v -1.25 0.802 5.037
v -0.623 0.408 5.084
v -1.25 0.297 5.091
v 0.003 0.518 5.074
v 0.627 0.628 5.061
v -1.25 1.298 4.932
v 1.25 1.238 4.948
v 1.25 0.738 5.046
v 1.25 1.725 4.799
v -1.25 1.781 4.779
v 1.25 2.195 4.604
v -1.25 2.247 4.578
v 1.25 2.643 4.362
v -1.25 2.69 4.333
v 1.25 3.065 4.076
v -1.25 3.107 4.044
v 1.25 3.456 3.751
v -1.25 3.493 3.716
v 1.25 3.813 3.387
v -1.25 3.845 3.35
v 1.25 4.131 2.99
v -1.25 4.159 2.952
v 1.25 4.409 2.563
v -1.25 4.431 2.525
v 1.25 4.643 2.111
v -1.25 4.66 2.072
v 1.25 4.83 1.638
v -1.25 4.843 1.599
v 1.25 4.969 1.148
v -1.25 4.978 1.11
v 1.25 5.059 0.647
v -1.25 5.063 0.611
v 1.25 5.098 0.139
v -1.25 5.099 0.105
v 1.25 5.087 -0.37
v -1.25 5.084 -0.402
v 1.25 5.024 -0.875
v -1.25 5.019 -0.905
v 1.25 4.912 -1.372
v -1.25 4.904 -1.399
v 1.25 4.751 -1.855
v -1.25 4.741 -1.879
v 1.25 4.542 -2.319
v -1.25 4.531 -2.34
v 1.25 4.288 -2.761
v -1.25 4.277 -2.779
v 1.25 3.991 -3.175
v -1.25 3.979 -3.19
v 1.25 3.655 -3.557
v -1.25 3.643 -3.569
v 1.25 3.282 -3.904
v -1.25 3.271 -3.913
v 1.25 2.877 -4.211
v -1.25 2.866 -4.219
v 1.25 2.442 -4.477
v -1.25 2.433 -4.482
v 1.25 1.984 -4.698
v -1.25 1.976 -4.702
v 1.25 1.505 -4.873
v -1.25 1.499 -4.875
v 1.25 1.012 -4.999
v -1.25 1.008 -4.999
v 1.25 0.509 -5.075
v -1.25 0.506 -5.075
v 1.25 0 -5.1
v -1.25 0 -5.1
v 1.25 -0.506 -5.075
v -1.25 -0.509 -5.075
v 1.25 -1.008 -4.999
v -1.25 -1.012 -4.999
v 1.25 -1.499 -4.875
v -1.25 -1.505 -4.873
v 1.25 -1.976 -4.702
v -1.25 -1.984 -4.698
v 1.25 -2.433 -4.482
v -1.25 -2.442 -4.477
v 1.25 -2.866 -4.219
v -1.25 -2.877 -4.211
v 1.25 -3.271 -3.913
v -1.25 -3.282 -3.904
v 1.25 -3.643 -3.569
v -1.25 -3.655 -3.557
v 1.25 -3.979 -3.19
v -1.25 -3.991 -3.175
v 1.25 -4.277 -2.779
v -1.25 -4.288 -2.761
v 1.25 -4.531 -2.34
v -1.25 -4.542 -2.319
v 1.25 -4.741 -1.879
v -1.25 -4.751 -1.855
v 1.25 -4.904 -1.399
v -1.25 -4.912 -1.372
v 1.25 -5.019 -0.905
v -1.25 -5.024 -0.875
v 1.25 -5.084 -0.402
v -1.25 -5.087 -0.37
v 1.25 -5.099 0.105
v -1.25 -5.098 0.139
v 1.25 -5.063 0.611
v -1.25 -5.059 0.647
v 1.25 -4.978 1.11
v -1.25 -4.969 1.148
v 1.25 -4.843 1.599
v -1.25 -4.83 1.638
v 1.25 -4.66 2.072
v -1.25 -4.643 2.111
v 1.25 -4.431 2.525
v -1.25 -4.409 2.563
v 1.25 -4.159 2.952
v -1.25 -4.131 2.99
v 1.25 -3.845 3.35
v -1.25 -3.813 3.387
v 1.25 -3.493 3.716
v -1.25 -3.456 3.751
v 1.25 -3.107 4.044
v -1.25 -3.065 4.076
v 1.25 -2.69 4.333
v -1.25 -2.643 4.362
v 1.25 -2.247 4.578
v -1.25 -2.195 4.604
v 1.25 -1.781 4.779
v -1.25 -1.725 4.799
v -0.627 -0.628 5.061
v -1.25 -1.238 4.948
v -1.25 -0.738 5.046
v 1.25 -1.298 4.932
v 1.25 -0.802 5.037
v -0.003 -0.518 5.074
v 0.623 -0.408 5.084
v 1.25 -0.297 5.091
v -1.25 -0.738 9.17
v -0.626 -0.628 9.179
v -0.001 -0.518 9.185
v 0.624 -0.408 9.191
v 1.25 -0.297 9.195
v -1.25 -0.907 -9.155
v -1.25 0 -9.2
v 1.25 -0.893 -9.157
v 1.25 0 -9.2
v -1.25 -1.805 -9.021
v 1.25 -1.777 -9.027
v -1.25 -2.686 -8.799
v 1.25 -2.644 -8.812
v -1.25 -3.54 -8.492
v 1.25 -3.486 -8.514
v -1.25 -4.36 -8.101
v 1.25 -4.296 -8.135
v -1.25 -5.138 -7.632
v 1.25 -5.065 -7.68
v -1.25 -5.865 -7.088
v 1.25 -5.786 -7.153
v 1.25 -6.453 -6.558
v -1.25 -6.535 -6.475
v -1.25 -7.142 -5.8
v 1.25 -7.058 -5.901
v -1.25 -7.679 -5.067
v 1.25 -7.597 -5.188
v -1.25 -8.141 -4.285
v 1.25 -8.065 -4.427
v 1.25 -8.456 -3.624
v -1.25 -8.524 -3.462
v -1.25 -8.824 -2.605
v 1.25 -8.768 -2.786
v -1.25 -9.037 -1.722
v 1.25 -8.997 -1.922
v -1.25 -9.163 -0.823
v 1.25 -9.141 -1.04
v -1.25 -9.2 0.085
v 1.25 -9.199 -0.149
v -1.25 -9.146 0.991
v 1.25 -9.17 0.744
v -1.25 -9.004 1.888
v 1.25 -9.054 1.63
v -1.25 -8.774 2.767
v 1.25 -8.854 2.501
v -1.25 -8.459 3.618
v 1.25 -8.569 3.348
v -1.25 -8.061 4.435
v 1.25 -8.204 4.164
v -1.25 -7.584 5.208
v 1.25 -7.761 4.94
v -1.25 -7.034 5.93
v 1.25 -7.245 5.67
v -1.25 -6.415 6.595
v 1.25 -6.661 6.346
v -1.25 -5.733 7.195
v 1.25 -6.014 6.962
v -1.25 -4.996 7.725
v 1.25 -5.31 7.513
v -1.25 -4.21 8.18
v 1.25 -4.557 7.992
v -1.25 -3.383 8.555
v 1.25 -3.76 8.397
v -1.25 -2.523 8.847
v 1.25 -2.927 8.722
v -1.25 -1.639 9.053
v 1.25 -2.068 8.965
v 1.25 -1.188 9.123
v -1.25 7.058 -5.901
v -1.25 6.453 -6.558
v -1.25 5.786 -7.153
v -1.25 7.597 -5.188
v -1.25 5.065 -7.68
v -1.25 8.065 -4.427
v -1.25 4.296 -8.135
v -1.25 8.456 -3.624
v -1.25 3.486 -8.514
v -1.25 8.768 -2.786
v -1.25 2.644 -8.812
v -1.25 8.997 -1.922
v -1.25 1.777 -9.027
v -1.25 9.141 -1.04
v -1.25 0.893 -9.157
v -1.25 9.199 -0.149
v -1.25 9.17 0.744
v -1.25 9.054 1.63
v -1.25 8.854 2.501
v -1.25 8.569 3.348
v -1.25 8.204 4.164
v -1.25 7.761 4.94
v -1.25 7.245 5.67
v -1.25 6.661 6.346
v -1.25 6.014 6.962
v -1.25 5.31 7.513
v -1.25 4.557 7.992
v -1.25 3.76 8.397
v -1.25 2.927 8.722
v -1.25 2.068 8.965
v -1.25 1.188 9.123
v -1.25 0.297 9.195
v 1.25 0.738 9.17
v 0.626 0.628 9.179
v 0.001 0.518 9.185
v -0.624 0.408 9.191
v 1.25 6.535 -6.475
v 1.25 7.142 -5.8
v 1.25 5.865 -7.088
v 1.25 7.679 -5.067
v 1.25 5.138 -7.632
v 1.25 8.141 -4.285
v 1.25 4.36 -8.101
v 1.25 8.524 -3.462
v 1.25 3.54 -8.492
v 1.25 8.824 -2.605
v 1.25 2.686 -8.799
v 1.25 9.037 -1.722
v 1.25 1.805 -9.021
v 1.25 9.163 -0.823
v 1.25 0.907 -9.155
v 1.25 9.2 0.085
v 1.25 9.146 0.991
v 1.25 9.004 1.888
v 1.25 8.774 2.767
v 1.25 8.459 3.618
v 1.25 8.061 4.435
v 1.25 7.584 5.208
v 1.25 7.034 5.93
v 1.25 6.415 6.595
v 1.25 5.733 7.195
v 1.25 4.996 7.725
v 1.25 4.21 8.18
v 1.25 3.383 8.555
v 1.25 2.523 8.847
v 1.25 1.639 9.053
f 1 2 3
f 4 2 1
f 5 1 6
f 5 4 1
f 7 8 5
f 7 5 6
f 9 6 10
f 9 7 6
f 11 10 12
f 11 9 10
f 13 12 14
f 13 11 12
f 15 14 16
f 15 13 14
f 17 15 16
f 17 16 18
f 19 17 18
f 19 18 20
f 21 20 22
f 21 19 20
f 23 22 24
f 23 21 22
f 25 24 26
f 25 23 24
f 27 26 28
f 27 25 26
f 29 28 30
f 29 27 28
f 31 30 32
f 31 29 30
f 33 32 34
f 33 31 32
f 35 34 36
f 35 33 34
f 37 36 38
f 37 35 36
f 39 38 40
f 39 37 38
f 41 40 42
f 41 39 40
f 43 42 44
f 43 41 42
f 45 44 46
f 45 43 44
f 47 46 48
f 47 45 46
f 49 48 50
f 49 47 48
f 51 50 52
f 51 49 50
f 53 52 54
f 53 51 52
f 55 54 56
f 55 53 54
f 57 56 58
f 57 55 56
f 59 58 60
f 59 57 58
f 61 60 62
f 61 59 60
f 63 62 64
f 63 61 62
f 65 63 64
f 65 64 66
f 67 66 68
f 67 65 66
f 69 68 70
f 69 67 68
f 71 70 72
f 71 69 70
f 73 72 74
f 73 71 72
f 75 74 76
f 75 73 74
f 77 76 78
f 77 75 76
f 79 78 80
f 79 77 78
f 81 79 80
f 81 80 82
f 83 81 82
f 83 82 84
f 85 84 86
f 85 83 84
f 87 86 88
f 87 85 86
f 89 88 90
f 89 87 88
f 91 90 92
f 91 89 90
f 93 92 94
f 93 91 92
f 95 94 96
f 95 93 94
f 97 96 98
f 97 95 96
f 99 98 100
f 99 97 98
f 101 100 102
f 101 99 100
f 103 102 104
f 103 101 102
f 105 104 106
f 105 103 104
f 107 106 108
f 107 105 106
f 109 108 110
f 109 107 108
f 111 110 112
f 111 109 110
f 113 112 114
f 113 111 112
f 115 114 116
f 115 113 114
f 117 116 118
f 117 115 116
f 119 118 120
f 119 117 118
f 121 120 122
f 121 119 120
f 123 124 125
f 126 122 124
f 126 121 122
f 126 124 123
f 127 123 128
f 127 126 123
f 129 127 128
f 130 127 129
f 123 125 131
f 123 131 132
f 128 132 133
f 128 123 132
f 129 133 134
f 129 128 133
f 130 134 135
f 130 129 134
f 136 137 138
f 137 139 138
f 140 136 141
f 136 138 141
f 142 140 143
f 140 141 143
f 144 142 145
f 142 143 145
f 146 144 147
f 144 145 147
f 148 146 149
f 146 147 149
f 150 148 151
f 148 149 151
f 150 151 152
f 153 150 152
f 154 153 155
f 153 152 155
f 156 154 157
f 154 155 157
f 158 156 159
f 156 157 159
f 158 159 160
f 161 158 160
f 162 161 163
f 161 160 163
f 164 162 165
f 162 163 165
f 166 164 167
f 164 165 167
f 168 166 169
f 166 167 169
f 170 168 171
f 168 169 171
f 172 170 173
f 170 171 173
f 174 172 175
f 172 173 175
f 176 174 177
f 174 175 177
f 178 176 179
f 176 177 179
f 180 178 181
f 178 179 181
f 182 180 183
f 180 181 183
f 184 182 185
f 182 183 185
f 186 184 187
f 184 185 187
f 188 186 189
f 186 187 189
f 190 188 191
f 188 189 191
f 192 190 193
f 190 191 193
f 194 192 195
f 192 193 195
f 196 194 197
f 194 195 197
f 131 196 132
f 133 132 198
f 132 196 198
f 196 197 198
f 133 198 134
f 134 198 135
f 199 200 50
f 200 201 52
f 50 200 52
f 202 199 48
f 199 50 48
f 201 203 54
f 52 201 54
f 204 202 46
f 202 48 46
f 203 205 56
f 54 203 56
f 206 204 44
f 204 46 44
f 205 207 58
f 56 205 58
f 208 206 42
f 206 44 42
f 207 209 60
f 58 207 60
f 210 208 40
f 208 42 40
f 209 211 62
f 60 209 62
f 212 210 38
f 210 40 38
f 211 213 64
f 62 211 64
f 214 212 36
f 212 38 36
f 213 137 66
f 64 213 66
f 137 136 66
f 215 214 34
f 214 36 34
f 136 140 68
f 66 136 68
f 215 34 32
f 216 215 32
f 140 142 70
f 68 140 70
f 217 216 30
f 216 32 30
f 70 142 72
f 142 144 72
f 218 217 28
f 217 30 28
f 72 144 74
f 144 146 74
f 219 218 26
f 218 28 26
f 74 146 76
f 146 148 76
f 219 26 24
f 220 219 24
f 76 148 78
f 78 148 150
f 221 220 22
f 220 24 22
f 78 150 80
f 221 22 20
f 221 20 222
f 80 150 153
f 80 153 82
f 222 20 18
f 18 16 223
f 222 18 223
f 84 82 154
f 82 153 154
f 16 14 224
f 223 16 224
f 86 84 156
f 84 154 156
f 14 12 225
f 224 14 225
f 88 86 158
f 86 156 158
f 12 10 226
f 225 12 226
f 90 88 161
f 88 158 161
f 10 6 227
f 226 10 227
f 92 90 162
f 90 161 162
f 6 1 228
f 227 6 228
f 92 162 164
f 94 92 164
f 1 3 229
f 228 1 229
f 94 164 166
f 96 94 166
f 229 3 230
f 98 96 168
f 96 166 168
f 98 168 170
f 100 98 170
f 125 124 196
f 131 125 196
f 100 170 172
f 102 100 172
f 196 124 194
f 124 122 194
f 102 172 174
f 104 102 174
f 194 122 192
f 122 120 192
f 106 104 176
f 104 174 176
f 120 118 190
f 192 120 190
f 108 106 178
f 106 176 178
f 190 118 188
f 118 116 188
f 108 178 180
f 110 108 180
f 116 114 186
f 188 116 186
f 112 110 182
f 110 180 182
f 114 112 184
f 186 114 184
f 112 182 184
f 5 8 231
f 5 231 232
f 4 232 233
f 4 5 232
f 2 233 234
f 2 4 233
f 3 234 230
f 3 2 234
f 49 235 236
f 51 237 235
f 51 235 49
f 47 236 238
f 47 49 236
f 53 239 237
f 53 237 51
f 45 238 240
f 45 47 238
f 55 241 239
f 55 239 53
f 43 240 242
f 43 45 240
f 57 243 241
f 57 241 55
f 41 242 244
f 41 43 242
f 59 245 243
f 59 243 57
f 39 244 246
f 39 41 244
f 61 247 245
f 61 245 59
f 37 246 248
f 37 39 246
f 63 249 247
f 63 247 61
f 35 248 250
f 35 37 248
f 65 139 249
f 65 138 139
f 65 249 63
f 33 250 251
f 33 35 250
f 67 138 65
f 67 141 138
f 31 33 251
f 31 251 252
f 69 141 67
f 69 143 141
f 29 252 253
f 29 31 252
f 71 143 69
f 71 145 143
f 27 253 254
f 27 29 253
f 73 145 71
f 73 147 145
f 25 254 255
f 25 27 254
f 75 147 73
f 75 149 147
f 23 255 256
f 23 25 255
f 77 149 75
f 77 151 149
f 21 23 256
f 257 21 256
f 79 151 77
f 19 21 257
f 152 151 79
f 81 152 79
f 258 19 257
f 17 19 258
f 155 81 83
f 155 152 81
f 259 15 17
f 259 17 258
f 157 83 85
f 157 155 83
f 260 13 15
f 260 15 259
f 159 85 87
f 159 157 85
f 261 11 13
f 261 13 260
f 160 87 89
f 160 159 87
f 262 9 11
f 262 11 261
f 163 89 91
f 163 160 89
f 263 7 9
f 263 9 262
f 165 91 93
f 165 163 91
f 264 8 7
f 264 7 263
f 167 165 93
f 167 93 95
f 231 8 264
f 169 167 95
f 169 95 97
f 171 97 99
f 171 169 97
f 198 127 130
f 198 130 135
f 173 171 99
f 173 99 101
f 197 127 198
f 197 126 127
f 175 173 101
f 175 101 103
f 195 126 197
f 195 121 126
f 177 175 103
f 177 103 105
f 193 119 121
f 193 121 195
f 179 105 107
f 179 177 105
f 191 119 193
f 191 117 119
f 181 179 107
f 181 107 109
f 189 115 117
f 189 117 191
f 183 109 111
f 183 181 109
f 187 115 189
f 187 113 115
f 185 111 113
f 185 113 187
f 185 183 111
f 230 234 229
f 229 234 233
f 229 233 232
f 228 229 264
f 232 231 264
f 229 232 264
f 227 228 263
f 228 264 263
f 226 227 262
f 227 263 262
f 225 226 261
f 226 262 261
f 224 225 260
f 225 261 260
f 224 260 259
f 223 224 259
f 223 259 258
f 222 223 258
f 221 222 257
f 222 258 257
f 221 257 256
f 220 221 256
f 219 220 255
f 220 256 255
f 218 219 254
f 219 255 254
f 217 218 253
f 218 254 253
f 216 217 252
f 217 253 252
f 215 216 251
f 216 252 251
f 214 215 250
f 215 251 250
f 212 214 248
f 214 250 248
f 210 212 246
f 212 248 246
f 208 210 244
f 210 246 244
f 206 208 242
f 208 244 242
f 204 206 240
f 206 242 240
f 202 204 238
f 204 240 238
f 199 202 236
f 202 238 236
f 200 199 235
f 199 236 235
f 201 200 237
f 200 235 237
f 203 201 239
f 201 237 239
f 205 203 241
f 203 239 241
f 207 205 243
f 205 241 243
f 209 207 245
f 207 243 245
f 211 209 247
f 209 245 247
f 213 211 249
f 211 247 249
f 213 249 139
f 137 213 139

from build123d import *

# Parameters (mm, degrees)
SKETCH1_W          = 2.5
SKETCH1_H          = 4.1
CUT_EXTRUDE1_DEPTH = 18.4


with BuildPart() as part:
    # Sketch1 → Revolve1 (revolve)
    with BuildSketch(Plane.XY, mode=Mode.PRIVATE) as revolve1_sk:
        with Locations((0, 7.15)):
            Rectangle(SKETCH1_W, SKETCH1_H)
    revolve(revolve1_sk.sketch.rotate(Axis((1.25, 0, 0), (-1, 0, 0)), 90), axis=Axis((1.25, 0, 0), (-1, 0, 0)))

    # Sketch2 → Cut-Extrude1 (cut)
    with BuildSketch(Plane.XY):
        Polygon((-1.427121141, 0.26622761), (-1.25, -0.738276298), (1.427121141, -0.26622761), (1.25, 0.738276298), align=None)
    extrude(amount=CUT_EXTRUDE1_DEPTH, mode=Mode.SUBTRACT)


solid = part.part
